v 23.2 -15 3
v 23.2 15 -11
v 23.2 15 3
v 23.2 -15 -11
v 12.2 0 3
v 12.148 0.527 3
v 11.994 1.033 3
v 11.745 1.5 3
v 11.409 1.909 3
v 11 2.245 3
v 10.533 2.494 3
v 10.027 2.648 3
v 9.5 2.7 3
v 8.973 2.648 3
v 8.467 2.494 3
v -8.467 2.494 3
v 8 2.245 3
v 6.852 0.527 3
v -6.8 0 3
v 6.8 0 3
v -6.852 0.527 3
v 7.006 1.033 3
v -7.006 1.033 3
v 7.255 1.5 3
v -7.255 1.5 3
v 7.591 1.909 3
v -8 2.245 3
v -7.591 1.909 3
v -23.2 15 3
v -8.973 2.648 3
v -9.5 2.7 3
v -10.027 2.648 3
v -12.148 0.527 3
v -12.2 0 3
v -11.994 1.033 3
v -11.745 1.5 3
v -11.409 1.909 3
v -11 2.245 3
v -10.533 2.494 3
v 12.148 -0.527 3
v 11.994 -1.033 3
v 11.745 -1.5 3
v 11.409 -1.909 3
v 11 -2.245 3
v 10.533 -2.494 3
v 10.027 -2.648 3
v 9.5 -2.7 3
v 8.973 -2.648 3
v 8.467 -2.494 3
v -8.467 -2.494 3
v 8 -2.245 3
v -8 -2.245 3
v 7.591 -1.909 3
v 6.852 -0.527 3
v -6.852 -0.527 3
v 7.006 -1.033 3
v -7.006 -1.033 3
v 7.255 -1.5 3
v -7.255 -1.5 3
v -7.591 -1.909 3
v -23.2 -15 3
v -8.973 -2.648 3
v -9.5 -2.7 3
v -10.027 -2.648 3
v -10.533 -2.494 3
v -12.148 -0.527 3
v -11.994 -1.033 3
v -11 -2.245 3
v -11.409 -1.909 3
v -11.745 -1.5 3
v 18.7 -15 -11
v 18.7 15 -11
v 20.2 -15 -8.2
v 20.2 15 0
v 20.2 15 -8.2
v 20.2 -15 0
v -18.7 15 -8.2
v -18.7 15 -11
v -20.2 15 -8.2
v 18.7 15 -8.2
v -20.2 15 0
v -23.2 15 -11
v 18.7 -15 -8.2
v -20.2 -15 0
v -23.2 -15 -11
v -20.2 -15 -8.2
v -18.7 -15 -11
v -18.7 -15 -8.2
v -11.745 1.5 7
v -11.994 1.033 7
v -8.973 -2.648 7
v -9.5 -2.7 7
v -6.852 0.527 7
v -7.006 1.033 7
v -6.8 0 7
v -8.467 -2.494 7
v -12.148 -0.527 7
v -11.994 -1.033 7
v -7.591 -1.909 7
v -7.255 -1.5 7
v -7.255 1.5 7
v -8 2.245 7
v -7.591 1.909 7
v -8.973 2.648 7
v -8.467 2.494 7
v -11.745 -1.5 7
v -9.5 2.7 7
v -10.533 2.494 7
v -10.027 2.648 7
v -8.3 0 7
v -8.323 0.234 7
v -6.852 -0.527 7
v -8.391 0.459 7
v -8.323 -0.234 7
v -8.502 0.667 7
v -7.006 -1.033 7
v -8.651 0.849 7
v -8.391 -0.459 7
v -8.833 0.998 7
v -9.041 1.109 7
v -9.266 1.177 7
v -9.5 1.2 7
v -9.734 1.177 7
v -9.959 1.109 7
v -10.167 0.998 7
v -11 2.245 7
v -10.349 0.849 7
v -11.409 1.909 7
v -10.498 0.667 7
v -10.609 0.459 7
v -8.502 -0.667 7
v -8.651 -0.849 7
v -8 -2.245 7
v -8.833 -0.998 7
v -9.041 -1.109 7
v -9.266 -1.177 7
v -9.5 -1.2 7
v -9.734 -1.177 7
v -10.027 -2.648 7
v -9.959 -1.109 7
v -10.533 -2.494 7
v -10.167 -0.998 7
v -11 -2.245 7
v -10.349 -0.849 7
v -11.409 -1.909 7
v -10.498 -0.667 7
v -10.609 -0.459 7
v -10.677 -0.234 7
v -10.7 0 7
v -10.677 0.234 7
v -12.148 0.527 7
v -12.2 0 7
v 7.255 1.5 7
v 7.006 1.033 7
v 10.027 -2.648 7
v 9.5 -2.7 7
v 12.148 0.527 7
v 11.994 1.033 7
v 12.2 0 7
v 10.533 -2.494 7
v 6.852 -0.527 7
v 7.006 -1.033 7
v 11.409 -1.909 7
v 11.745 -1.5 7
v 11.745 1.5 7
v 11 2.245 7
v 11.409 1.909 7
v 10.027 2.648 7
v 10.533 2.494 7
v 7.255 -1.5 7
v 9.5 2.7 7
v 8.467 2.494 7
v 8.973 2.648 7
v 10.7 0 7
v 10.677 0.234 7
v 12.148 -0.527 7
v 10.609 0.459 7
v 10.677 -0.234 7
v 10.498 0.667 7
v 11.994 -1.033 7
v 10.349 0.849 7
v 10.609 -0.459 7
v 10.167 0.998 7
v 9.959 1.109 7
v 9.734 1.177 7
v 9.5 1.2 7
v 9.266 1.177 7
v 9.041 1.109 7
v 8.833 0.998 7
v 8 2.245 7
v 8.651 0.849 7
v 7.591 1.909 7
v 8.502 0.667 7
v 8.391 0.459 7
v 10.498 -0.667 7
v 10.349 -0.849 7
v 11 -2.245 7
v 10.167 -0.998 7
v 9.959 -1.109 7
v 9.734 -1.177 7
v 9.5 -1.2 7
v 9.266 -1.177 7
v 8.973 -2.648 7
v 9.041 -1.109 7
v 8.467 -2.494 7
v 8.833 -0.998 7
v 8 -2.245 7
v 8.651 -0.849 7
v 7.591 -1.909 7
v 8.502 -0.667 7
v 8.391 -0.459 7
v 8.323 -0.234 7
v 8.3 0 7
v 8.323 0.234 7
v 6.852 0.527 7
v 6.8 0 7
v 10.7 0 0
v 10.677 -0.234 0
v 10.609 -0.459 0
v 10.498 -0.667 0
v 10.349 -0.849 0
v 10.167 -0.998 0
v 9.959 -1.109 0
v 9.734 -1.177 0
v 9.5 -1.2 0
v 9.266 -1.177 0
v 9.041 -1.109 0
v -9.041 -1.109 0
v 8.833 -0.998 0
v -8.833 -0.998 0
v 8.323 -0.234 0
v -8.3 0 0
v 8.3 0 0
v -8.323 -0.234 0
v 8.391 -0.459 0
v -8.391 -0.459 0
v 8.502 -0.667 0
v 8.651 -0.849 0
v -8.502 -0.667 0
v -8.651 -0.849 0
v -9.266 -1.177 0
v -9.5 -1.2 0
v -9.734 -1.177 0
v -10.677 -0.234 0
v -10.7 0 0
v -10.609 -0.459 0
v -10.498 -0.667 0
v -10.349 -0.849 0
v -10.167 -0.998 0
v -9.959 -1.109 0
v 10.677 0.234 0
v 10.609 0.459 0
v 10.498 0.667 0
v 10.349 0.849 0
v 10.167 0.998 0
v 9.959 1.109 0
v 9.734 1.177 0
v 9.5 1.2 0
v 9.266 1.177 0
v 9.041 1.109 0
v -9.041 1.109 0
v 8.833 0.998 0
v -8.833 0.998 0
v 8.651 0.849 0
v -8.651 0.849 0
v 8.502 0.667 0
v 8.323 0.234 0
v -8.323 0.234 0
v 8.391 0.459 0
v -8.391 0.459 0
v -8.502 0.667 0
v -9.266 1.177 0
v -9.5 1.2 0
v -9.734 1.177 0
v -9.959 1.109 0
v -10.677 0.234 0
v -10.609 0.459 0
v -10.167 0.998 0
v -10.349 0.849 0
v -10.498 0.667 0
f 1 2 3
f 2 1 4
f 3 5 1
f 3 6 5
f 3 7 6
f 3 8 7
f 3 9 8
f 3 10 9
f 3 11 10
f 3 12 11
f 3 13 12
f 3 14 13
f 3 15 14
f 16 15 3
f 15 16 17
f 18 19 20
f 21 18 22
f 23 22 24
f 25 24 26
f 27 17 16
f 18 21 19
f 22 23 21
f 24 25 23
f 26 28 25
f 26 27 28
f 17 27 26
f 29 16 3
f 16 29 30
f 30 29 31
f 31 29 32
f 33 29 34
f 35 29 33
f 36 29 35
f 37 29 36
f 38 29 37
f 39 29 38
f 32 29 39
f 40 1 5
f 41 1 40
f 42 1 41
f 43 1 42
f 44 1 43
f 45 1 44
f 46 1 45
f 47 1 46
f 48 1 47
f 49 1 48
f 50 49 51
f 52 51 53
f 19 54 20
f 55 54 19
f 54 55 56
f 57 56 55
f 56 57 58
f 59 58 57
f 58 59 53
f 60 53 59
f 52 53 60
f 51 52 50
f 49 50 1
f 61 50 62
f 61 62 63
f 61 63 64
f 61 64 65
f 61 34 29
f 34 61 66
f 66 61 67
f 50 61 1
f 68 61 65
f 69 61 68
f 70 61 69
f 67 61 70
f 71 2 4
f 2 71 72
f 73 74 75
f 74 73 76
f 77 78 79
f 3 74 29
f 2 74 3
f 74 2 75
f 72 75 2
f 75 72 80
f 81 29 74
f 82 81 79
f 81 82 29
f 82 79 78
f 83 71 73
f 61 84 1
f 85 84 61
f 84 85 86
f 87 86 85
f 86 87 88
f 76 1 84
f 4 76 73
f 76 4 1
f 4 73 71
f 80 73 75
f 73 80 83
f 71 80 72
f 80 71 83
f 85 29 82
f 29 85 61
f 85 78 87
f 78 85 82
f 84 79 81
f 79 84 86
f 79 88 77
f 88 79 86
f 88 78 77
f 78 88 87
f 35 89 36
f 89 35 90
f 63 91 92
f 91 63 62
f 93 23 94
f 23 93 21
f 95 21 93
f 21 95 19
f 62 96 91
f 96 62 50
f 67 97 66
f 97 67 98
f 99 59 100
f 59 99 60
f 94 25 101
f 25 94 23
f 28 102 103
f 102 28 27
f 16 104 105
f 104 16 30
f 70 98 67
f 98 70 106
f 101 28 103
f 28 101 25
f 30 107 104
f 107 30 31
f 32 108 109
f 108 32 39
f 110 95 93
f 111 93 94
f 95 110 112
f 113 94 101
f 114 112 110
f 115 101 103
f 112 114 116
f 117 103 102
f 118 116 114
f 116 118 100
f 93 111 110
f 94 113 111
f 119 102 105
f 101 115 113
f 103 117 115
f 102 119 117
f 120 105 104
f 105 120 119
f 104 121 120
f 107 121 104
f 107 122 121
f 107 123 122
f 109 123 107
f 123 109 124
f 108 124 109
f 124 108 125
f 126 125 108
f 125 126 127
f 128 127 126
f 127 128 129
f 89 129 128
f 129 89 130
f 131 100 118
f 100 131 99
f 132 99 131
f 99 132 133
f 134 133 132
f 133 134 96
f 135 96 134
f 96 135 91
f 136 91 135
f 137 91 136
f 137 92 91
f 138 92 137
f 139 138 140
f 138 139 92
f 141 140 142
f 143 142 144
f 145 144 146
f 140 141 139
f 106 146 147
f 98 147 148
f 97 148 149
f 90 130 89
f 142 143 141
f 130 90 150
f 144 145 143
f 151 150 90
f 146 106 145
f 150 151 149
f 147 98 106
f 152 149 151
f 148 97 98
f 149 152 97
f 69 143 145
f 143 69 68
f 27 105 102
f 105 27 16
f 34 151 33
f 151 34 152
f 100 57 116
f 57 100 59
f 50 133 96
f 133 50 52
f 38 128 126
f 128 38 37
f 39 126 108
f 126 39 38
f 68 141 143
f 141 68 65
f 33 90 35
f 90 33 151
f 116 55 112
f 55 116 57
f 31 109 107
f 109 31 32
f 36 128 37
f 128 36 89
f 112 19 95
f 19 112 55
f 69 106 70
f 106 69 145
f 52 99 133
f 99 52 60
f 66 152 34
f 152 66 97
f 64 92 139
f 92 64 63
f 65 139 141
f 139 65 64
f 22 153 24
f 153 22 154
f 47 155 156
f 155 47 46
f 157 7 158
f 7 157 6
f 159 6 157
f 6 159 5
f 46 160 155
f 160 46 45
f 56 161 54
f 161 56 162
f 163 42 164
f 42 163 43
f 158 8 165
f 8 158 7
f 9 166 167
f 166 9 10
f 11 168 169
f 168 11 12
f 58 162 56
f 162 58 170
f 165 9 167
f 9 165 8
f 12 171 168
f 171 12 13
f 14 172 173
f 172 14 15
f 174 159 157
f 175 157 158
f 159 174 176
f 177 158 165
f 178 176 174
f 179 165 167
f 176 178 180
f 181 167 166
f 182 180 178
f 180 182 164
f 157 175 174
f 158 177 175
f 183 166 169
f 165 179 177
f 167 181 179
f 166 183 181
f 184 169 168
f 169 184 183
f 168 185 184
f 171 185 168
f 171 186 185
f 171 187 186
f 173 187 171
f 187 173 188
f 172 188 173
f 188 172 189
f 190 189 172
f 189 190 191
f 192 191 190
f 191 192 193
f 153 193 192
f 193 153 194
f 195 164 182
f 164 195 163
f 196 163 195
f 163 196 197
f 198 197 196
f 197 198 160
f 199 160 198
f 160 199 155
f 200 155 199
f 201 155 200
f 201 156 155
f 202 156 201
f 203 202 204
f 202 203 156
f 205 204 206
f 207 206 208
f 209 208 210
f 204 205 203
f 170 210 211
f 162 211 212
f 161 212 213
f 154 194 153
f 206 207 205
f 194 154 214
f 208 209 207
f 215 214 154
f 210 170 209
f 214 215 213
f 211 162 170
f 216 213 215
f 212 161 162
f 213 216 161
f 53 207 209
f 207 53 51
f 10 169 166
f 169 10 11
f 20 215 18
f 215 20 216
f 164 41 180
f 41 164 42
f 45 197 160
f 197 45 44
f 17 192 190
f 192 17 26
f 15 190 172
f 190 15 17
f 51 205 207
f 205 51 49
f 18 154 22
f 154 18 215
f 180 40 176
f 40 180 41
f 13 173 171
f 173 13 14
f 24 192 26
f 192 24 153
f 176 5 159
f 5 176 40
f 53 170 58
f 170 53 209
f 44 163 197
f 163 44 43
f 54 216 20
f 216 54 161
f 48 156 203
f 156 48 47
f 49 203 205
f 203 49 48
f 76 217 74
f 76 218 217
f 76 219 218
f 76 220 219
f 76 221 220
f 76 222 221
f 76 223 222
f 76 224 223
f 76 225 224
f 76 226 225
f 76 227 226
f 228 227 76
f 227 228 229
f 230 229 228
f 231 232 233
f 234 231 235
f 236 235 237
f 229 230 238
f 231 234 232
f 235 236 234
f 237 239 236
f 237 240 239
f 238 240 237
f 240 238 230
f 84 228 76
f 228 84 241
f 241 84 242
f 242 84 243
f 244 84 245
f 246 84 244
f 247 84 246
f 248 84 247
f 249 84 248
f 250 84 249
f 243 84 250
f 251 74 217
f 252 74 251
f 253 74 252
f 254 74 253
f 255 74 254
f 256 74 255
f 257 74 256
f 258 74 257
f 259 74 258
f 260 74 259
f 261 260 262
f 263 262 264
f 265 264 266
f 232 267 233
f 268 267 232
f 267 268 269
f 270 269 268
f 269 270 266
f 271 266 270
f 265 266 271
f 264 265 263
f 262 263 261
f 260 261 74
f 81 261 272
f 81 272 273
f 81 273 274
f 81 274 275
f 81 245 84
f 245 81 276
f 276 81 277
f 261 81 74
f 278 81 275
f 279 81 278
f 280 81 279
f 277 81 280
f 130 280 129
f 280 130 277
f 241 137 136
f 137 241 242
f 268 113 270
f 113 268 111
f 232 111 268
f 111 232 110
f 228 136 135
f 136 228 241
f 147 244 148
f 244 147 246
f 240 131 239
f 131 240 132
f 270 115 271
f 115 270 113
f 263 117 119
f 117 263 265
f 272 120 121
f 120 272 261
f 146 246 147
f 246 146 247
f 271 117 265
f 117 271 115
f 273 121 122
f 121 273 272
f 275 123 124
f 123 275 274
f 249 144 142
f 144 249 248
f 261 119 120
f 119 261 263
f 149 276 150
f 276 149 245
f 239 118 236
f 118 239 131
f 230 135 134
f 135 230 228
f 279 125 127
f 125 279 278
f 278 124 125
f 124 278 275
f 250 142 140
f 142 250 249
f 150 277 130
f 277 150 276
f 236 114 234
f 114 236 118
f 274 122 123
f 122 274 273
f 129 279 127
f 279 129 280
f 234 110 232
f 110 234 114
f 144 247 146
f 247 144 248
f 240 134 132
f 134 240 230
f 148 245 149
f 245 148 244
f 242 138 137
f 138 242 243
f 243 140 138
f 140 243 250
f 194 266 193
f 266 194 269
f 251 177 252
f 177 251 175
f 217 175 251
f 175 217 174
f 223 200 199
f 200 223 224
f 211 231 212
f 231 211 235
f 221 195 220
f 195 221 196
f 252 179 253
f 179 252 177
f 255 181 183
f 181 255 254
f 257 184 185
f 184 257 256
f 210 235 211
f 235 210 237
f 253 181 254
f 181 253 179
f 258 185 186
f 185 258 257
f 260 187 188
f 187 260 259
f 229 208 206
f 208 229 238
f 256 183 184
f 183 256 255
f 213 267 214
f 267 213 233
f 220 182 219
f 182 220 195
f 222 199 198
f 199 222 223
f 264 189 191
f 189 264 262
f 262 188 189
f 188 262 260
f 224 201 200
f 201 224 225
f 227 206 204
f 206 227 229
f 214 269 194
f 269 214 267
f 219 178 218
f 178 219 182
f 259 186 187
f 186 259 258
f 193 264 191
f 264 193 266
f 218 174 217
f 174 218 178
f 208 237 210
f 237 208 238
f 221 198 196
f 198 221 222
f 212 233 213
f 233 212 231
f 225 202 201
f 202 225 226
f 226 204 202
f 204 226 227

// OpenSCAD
// DP200 print head clip for a USB accelerometer board (input shaping, X axis).
// DRAFT: the head dimensions below are placeholders - measure the head and
// set them before printing (docs/input_shaping.md, "Mounts").
//
// A bridge sits on top of the print head; two arms reach down its sides and
// hook into the notches near the top of each side. The sensor board screws
// to the bridge. Print it bridge-down in PETG/PLA, 4 walls, 40 % infill: it
// has to be stiff, a flexible mount measures its own wobble.

/* [Print head - MEASURE] */
head_width      = 40;   // across the head where the arms grip (mm)
head_depth      = 30;   // front-to-back length of the bridge (mm)
notch_down      = 8;    // top of head -> top edge of the side notches (mm)
notch_height    = 3;    // notch opening height (mm)
notch_depth     = 1.5;  // how far the hook reaches into the notch (mm)
fit             = 0.2;  // clearance per side (snap fit: 0.1-0.3)

/* [Sensor board] */
// BTT ADXL345 V2.0 placeholders - check against the board
board_holes     = [[-9.5, 0], [9.5, 0]];  // hole positions from the bridge centre
hole_d          = 2.4;                     // M2 screw, self-tapping into the plastic
standoff        = 4;                       // keep the parts on the back of the board clear

/* [Part] */
wall            = 3;    // bridge and arm thickness (stiffness)

$fn = 32;
w = head_width + 2 * fit;

module arm() {
    // arm down the side of the head, hook pointing inward at the notch
    translate([0, -head_depth / 2, -(notch_down + notch_height)])
        cube([wall, head_depth, notch_down + notch_height + wall]);
    translate([-notch_depth, -head_depth / 2, -(notch_down + notch_height)])
        cube([notch_depth + wall, head_depth, notch_height - fit]);
}

difference() {
    union() {
        // bridge over the top
        translate([-w / 2 - wall, -head_depth / 2, 0]) cube([w + 2 * wall, head_depth, wall]);
        translate([w / 2, 0, 0]) arm();
        translate([-w / 2, 0, 0]) mirror([1, 0, 0]) arm();
        // standoffs for the board
        for (p = board_holes) translate([p[0], p[1], wall]) cylinder(d = hole_d + 3, h = standoff);
    }
    for (p = board_holes) translate([p[0], p[1], -1]) cylinder(d = hole_d, h = wall + standoff + 2);
}
